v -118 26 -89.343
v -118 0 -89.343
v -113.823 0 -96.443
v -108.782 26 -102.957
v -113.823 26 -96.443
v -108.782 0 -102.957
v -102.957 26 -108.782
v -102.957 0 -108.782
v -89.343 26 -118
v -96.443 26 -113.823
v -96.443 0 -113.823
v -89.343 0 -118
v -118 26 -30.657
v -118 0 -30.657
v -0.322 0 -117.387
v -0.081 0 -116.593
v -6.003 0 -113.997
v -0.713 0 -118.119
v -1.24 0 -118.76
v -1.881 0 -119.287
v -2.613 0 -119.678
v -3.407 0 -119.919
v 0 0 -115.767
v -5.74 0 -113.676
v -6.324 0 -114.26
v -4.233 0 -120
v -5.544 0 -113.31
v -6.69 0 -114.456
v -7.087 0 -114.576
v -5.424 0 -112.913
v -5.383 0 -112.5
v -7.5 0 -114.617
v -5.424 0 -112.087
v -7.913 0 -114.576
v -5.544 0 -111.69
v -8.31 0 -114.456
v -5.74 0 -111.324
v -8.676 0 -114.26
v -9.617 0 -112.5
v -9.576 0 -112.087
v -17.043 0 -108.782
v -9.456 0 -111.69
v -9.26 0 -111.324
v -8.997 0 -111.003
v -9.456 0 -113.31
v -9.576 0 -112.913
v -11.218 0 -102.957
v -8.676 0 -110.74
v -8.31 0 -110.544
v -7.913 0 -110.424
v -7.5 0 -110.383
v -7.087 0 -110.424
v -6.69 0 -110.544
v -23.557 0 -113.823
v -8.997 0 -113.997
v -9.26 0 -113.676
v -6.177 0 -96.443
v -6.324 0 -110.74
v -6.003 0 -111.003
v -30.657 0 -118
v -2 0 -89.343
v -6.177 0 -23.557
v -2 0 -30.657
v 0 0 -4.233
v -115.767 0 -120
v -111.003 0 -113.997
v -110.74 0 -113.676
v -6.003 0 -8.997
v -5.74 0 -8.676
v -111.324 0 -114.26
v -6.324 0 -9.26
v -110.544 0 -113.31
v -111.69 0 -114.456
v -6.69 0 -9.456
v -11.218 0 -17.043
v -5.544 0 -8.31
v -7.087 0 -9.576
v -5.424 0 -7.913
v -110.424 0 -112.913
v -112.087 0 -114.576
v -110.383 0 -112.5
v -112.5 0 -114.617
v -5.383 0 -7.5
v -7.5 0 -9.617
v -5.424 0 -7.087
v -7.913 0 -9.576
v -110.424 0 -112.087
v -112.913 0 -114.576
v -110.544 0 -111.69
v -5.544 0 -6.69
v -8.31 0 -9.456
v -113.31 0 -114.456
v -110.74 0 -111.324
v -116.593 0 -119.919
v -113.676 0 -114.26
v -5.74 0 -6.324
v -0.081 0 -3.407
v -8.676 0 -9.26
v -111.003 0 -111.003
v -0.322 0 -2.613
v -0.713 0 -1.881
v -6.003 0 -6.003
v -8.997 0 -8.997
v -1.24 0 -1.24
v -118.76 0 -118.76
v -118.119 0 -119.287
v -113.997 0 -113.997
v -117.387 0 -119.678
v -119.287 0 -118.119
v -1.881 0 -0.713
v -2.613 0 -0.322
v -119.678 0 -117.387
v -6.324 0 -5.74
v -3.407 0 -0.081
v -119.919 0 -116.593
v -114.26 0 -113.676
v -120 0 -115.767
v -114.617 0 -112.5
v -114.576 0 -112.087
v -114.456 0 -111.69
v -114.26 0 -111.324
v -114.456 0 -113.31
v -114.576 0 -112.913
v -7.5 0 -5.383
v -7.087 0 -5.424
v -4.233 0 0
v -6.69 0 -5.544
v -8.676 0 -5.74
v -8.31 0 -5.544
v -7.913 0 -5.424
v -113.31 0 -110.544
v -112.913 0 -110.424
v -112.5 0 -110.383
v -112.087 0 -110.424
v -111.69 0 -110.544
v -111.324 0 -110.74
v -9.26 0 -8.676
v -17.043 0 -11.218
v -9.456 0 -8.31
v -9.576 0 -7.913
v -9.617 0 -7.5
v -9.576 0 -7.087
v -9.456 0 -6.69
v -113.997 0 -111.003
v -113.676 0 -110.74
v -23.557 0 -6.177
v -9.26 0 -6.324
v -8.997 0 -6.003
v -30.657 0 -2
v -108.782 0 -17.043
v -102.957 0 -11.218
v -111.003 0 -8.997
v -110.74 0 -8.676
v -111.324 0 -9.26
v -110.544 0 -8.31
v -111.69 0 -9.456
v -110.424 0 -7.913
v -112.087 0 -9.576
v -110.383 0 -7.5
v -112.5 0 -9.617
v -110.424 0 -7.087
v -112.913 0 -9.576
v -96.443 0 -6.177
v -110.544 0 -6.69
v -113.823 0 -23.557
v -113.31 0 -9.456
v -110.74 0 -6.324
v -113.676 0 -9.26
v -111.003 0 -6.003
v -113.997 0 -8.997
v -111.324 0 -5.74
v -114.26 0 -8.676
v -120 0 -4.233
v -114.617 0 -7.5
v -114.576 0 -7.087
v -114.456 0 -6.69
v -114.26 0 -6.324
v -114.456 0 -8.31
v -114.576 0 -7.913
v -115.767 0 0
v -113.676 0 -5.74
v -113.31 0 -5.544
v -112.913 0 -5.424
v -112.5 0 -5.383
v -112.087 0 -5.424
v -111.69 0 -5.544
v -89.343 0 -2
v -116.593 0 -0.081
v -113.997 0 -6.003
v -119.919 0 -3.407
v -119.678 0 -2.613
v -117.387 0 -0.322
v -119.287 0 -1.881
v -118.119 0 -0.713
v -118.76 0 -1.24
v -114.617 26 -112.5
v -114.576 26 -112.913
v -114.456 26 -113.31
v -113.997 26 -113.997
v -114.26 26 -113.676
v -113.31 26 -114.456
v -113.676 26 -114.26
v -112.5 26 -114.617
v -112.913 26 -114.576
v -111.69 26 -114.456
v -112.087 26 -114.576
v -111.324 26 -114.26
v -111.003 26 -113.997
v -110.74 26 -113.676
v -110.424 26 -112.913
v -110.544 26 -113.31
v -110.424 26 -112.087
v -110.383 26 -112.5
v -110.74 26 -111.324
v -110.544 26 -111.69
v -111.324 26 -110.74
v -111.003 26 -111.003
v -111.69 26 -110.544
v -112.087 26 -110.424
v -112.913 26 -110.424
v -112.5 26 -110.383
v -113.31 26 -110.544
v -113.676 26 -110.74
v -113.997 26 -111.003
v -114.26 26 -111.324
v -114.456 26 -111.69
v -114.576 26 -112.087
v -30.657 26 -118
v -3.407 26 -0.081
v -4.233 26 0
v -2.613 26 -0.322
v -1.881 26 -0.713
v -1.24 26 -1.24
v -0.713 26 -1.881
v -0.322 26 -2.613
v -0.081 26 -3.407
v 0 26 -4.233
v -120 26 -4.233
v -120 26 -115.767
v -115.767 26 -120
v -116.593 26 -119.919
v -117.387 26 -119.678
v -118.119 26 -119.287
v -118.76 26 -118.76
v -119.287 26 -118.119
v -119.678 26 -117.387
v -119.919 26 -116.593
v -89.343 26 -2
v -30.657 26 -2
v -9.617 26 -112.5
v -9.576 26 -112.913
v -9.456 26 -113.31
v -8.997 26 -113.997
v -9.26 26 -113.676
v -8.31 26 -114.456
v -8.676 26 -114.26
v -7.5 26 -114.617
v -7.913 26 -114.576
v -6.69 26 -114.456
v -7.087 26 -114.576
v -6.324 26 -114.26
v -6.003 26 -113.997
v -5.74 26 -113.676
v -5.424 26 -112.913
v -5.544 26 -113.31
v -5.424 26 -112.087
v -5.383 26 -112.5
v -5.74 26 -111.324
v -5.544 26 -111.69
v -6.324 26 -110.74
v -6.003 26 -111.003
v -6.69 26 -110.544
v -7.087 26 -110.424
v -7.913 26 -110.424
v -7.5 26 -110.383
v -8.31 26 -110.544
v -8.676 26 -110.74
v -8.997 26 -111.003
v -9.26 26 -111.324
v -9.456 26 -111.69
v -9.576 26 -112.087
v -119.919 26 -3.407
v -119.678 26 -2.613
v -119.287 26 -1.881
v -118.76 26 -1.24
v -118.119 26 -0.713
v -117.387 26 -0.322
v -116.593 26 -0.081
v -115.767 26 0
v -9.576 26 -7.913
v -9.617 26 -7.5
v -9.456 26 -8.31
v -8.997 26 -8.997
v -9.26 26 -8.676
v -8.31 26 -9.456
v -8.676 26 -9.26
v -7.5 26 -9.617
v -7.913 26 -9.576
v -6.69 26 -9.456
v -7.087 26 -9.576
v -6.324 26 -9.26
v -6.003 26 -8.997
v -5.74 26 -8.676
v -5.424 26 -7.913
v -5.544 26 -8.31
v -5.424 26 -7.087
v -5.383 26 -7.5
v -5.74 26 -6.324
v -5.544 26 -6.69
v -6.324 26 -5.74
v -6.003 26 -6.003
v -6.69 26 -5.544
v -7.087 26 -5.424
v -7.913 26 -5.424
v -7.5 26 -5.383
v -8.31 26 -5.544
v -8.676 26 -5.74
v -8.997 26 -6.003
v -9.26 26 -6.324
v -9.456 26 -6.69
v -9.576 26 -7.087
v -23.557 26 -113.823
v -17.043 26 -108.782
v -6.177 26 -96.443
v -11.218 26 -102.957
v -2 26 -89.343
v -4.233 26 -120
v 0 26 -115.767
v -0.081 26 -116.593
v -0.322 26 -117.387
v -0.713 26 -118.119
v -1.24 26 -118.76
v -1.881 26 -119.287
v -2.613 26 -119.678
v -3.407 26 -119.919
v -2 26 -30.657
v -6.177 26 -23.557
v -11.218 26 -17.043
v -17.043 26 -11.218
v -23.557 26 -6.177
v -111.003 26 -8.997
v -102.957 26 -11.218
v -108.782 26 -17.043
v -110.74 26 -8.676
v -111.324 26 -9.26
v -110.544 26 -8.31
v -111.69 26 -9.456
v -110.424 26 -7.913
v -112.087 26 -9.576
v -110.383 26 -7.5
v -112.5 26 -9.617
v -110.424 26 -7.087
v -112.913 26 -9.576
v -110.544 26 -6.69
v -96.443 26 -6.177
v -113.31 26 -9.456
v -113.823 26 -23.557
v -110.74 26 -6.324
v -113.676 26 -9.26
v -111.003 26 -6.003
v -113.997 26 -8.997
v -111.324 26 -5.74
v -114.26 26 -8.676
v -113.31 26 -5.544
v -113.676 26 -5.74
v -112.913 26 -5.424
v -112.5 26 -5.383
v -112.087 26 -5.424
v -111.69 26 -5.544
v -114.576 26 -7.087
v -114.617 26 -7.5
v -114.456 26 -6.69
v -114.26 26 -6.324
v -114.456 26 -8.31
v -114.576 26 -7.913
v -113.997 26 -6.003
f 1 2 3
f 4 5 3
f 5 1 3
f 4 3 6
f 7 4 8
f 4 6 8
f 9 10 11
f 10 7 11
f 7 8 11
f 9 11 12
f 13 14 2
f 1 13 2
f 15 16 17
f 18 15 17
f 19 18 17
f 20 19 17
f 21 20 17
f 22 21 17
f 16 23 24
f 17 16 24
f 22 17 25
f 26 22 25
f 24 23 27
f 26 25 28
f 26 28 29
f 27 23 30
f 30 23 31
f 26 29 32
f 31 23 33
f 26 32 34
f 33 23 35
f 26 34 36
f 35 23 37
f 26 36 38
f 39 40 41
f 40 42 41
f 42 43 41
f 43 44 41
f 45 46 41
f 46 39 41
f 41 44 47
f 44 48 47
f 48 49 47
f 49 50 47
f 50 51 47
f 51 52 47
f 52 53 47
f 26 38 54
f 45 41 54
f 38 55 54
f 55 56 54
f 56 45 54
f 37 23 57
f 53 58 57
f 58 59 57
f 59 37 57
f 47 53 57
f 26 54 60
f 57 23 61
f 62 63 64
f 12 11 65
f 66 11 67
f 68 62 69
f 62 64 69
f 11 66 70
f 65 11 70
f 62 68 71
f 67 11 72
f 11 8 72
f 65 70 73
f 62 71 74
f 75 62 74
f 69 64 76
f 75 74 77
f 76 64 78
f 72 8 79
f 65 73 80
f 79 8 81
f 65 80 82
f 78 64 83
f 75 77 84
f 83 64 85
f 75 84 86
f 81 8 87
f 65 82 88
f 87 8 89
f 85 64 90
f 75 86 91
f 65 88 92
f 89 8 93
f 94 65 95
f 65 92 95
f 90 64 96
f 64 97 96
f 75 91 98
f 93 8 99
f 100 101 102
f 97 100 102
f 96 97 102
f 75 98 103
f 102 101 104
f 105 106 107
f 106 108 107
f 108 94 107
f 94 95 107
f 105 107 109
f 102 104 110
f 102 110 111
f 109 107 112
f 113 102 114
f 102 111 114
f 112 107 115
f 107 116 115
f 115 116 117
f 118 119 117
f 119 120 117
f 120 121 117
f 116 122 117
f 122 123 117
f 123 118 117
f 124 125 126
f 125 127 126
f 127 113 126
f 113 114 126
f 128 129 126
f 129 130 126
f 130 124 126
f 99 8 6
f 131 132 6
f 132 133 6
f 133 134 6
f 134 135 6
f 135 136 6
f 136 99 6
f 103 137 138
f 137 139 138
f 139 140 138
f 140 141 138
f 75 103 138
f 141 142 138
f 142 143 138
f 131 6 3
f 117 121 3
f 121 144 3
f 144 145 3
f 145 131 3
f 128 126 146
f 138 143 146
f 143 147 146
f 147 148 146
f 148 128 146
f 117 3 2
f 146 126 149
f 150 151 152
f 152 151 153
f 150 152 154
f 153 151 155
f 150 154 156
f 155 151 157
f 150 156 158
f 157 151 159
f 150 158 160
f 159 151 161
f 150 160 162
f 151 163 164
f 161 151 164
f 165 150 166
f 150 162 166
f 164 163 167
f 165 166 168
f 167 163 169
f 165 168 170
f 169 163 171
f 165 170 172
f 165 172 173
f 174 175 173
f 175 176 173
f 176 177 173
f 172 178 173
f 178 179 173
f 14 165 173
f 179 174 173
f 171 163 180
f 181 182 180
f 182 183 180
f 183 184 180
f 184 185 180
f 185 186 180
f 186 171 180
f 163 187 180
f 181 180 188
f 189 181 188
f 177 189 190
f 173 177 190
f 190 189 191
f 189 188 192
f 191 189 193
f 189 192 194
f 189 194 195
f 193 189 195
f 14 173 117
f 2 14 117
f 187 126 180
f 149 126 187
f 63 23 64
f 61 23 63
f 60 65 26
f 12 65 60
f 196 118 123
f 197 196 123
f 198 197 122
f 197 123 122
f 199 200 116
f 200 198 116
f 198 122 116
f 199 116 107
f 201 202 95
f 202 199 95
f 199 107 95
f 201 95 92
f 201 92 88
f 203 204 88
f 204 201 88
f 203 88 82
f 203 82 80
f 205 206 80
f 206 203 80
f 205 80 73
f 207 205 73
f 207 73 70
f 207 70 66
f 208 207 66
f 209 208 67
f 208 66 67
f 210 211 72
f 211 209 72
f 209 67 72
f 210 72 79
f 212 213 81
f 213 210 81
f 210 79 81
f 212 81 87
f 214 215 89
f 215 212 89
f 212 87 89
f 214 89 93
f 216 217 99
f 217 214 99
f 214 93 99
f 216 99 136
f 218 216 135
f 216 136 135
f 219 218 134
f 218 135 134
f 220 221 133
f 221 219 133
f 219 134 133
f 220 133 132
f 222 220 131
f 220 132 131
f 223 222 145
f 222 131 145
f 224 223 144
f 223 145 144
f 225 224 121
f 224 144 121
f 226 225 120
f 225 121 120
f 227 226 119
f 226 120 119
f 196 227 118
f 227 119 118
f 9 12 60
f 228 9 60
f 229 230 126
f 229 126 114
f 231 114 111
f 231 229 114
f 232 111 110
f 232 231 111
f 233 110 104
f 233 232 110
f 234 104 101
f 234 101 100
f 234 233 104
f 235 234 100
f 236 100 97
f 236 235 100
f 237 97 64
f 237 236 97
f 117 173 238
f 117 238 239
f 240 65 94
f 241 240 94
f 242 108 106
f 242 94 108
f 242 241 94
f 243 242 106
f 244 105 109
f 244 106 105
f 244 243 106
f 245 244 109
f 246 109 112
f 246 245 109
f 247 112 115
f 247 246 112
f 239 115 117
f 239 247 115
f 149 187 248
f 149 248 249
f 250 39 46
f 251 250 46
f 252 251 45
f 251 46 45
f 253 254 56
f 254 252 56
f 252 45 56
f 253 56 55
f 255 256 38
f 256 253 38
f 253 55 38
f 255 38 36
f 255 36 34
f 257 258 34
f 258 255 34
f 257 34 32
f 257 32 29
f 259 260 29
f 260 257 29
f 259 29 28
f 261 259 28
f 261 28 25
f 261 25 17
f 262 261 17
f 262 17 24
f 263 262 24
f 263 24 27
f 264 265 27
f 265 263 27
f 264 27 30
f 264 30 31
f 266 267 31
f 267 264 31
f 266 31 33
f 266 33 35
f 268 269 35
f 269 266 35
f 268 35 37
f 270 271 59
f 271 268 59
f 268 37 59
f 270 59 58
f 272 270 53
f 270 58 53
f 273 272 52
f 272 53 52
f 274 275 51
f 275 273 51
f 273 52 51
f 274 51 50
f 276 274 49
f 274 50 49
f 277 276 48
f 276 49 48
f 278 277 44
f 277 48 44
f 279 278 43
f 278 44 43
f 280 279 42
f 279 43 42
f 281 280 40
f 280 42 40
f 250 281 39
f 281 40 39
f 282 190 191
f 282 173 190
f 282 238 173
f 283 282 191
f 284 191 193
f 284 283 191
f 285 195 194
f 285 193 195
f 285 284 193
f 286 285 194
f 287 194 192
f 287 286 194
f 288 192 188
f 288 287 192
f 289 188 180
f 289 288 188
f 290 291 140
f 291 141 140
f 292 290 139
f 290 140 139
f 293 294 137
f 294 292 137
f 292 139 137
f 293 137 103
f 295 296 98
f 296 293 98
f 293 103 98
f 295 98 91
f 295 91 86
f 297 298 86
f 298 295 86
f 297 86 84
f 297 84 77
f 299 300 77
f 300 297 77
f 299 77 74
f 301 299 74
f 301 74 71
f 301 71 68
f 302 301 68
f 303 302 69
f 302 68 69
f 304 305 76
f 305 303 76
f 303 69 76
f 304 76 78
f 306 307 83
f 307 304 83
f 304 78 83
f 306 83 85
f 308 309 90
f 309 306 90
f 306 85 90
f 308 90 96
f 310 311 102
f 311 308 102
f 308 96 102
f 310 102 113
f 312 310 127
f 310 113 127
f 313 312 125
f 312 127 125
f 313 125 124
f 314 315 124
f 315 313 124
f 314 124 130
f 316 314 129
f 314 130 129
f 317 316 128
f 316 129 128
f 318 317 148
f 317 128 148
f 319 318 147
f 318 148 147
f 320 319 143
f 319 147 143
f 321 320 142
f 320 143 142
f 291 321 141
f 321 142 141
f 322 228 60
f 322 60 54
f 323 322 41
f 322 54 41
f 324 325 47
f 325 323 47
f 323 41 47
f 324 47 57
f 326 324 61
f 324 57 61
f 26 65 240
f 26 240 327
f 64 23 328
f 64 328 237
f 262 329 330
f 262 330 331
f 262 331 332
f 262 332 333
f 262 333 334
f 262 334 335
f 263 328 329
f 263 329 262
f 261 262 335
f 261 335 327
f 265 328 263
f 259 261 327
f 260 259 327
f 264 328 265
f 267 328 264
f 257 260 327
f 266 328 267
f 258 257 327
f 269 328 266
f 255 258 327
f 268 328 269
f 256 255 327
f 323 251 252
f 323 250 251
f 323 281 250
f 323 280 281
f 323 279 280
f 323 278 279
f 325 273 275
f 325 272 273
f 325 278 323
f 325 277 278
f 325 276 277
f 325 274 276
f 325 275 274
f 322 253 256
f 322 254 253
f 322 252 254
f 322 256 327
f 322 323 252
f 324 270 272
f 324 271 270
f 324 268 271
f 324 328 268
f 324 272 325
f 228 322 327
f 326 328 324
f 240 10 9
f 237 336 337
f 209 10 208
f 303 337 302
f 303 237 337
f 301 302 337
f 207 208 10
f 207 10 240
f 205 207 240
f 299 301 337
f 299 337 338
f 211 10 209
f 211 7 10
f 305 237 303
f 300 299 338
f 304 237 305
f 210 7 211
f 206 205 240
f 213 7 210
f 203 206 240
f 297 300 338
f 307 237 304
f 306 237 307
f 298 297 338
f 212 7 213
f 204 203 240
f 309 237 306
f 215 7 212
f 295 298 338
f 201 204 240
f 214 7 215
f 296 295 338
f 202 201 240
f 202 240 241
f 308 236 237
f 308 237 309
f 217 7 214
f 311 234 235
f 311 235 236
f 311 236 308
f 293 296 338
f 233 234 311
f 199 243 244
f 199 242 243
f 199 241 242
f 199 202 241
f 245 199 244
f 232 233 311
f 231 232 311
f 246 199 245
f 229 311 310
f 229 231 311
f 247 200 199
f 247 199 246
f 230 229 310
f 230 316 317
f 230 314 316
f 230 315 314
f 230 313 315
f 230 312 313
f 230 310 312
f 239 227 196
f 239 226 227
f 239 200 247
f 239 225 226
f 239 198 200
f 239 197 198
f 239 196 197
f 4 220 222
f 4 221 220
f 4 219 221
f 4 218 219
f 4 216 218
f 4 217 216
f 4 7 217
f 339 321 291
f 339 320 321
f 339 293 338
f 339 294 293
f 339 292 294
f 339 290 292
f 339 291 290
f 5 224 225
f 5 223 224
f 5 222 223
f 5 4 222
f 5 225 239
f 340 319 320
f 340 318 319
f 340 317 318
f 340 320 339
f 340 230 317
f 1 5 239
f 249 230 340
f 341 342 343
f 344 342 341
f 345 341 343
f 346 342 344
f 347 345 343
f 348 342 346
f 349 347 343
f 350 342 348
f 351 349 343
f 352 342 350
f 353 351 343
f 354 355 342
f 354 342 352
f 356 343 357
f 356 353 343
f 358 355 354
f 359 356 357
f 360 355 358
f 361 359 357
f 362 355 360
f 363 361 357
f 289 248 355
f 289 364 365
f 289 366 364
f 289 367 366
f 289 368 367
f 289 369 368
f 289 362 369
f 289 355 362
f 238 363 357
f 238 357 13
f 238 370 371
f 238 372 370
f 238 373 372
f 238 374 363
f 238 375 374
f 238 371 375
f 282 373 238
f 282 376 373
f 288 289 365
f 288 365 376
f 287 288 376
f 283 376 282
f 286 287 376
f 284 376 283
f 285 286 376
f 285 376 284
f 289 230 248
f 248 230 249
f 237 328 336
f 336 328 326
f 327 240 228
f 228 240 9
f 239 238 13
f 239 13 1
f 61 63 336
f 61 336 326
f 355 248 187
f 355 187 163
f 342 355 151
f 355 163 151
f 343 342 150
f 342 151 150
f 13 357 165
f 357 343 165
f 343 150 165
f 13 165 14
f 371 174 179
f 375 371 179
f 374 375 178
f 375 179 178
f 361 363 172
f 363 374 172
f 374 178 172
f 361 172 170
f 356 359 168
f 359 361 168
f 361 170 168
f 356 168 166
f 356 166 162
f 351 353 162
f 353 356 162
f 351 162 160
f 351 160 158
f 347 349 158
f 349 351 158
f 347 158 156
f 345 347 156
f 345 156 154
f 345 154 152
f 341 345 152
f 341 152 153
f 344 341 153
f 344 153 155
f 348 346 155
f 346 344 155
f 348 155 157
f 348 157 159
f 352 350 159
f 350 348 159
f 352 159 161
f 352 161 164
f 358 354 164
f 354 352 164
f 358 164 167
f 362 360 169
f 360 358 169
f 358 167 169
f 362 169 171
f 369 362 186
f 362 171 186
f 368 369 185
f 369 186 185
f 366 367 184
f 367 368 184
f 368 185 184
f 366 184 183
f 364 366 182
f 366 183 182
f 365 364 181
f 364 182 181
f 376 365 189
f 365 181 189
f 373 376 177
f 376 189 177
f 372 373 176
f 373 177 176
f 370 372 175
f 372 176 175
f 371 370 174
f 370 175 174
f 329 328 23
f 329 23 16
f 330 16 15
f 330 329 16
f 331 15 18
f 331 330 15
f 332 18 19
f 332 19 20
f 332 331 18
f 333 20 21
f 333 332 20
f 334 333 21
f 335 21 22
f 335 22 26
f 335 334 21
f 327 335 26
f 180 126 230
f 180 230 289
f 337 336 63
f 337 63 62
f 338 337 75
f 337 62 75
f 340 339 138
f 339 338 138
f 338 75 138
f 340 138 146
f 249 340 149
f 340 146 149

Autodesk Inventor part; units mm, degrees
ref_plane "YZ Plane" through (0, 0, 0) normal (1, 0, 0) x (0, 1, 0)
ref_plane "XZ Plane" through (0, 0, 0) normal (0, 1, 0) x (-1, 0, 0)
ref_plane "XY Plane" through (0, 0, 0) normal (0, 0, 1) x (1, 0, 0)
sketch "Sketch1" plane through (0, 0, 0) normal (0, 1, 0) x (-1, 0, 0)
  line L0 (0, 0) -> (120, 0)
  line L1 (120, 0) -> (120, -120)
  line L2 (120, -120) -> (0, -120)
  line L3 (0, -120) -> (0, 0)
  line L4 (112.5, -7.5) -> (7.5, -7.5) construction
  line L5 (7.5, -7.5) -> (7.5, -112.5) construction
  line L6 (7.5, -112.5) -> (112.5, -112.5) construction
  line L7 (112.5, -112.5) -> (112.5, -7.5) construction
  line L8 (112.5, -60) -> (120, -60) construction
  line L9 (60, -112.5) -> (60, -120) construction
  circle A0 centre (112.5, -7.5) radius 2.1167
  circle A1 centre (112.5, -112.5) radius 2.1167
  circle A2 centre (7.5, -112.5) radius 2.1167
  circle A3 centre (7.5, -7.5) radius 2.1167
  circle A4 centre (60, -60) radius 65
  line L10 (89.3428, -2) -> (30.6572, -2)
  line L11 (118, -30.6572) -> (118, -89.3428)
  line L12 (89.3428, -118) -> (30.6572, -118)
  line L13 (2, -30.6572) -> (2, -89.3428)
  point P0 (116.25, -60)
  point P1 (60, -116.25)
  dimension "d3" = 130
  dimension "d0" = 120
  dimension "d1" = 105
  dimension "d2" = 4.2333
  dimension "d4" = 2
extrude "Extrusion1" add sketch "Sketch1" along normal blind 26 contours L0 A4 L3 | L0 A4 L10 | A4 L13 L3 | L0 L1 A4 | A4 L2 L3 | L1 A4 L11 | A4 L12 L2 | L1 L2 A4
fillet "Fillet1" radius 4.2333 4 edges at (0, 13, -120) (-120, 13, -120) (-120, 13, 0) (0, 13, 0)
properties part number "120mm_fan"
